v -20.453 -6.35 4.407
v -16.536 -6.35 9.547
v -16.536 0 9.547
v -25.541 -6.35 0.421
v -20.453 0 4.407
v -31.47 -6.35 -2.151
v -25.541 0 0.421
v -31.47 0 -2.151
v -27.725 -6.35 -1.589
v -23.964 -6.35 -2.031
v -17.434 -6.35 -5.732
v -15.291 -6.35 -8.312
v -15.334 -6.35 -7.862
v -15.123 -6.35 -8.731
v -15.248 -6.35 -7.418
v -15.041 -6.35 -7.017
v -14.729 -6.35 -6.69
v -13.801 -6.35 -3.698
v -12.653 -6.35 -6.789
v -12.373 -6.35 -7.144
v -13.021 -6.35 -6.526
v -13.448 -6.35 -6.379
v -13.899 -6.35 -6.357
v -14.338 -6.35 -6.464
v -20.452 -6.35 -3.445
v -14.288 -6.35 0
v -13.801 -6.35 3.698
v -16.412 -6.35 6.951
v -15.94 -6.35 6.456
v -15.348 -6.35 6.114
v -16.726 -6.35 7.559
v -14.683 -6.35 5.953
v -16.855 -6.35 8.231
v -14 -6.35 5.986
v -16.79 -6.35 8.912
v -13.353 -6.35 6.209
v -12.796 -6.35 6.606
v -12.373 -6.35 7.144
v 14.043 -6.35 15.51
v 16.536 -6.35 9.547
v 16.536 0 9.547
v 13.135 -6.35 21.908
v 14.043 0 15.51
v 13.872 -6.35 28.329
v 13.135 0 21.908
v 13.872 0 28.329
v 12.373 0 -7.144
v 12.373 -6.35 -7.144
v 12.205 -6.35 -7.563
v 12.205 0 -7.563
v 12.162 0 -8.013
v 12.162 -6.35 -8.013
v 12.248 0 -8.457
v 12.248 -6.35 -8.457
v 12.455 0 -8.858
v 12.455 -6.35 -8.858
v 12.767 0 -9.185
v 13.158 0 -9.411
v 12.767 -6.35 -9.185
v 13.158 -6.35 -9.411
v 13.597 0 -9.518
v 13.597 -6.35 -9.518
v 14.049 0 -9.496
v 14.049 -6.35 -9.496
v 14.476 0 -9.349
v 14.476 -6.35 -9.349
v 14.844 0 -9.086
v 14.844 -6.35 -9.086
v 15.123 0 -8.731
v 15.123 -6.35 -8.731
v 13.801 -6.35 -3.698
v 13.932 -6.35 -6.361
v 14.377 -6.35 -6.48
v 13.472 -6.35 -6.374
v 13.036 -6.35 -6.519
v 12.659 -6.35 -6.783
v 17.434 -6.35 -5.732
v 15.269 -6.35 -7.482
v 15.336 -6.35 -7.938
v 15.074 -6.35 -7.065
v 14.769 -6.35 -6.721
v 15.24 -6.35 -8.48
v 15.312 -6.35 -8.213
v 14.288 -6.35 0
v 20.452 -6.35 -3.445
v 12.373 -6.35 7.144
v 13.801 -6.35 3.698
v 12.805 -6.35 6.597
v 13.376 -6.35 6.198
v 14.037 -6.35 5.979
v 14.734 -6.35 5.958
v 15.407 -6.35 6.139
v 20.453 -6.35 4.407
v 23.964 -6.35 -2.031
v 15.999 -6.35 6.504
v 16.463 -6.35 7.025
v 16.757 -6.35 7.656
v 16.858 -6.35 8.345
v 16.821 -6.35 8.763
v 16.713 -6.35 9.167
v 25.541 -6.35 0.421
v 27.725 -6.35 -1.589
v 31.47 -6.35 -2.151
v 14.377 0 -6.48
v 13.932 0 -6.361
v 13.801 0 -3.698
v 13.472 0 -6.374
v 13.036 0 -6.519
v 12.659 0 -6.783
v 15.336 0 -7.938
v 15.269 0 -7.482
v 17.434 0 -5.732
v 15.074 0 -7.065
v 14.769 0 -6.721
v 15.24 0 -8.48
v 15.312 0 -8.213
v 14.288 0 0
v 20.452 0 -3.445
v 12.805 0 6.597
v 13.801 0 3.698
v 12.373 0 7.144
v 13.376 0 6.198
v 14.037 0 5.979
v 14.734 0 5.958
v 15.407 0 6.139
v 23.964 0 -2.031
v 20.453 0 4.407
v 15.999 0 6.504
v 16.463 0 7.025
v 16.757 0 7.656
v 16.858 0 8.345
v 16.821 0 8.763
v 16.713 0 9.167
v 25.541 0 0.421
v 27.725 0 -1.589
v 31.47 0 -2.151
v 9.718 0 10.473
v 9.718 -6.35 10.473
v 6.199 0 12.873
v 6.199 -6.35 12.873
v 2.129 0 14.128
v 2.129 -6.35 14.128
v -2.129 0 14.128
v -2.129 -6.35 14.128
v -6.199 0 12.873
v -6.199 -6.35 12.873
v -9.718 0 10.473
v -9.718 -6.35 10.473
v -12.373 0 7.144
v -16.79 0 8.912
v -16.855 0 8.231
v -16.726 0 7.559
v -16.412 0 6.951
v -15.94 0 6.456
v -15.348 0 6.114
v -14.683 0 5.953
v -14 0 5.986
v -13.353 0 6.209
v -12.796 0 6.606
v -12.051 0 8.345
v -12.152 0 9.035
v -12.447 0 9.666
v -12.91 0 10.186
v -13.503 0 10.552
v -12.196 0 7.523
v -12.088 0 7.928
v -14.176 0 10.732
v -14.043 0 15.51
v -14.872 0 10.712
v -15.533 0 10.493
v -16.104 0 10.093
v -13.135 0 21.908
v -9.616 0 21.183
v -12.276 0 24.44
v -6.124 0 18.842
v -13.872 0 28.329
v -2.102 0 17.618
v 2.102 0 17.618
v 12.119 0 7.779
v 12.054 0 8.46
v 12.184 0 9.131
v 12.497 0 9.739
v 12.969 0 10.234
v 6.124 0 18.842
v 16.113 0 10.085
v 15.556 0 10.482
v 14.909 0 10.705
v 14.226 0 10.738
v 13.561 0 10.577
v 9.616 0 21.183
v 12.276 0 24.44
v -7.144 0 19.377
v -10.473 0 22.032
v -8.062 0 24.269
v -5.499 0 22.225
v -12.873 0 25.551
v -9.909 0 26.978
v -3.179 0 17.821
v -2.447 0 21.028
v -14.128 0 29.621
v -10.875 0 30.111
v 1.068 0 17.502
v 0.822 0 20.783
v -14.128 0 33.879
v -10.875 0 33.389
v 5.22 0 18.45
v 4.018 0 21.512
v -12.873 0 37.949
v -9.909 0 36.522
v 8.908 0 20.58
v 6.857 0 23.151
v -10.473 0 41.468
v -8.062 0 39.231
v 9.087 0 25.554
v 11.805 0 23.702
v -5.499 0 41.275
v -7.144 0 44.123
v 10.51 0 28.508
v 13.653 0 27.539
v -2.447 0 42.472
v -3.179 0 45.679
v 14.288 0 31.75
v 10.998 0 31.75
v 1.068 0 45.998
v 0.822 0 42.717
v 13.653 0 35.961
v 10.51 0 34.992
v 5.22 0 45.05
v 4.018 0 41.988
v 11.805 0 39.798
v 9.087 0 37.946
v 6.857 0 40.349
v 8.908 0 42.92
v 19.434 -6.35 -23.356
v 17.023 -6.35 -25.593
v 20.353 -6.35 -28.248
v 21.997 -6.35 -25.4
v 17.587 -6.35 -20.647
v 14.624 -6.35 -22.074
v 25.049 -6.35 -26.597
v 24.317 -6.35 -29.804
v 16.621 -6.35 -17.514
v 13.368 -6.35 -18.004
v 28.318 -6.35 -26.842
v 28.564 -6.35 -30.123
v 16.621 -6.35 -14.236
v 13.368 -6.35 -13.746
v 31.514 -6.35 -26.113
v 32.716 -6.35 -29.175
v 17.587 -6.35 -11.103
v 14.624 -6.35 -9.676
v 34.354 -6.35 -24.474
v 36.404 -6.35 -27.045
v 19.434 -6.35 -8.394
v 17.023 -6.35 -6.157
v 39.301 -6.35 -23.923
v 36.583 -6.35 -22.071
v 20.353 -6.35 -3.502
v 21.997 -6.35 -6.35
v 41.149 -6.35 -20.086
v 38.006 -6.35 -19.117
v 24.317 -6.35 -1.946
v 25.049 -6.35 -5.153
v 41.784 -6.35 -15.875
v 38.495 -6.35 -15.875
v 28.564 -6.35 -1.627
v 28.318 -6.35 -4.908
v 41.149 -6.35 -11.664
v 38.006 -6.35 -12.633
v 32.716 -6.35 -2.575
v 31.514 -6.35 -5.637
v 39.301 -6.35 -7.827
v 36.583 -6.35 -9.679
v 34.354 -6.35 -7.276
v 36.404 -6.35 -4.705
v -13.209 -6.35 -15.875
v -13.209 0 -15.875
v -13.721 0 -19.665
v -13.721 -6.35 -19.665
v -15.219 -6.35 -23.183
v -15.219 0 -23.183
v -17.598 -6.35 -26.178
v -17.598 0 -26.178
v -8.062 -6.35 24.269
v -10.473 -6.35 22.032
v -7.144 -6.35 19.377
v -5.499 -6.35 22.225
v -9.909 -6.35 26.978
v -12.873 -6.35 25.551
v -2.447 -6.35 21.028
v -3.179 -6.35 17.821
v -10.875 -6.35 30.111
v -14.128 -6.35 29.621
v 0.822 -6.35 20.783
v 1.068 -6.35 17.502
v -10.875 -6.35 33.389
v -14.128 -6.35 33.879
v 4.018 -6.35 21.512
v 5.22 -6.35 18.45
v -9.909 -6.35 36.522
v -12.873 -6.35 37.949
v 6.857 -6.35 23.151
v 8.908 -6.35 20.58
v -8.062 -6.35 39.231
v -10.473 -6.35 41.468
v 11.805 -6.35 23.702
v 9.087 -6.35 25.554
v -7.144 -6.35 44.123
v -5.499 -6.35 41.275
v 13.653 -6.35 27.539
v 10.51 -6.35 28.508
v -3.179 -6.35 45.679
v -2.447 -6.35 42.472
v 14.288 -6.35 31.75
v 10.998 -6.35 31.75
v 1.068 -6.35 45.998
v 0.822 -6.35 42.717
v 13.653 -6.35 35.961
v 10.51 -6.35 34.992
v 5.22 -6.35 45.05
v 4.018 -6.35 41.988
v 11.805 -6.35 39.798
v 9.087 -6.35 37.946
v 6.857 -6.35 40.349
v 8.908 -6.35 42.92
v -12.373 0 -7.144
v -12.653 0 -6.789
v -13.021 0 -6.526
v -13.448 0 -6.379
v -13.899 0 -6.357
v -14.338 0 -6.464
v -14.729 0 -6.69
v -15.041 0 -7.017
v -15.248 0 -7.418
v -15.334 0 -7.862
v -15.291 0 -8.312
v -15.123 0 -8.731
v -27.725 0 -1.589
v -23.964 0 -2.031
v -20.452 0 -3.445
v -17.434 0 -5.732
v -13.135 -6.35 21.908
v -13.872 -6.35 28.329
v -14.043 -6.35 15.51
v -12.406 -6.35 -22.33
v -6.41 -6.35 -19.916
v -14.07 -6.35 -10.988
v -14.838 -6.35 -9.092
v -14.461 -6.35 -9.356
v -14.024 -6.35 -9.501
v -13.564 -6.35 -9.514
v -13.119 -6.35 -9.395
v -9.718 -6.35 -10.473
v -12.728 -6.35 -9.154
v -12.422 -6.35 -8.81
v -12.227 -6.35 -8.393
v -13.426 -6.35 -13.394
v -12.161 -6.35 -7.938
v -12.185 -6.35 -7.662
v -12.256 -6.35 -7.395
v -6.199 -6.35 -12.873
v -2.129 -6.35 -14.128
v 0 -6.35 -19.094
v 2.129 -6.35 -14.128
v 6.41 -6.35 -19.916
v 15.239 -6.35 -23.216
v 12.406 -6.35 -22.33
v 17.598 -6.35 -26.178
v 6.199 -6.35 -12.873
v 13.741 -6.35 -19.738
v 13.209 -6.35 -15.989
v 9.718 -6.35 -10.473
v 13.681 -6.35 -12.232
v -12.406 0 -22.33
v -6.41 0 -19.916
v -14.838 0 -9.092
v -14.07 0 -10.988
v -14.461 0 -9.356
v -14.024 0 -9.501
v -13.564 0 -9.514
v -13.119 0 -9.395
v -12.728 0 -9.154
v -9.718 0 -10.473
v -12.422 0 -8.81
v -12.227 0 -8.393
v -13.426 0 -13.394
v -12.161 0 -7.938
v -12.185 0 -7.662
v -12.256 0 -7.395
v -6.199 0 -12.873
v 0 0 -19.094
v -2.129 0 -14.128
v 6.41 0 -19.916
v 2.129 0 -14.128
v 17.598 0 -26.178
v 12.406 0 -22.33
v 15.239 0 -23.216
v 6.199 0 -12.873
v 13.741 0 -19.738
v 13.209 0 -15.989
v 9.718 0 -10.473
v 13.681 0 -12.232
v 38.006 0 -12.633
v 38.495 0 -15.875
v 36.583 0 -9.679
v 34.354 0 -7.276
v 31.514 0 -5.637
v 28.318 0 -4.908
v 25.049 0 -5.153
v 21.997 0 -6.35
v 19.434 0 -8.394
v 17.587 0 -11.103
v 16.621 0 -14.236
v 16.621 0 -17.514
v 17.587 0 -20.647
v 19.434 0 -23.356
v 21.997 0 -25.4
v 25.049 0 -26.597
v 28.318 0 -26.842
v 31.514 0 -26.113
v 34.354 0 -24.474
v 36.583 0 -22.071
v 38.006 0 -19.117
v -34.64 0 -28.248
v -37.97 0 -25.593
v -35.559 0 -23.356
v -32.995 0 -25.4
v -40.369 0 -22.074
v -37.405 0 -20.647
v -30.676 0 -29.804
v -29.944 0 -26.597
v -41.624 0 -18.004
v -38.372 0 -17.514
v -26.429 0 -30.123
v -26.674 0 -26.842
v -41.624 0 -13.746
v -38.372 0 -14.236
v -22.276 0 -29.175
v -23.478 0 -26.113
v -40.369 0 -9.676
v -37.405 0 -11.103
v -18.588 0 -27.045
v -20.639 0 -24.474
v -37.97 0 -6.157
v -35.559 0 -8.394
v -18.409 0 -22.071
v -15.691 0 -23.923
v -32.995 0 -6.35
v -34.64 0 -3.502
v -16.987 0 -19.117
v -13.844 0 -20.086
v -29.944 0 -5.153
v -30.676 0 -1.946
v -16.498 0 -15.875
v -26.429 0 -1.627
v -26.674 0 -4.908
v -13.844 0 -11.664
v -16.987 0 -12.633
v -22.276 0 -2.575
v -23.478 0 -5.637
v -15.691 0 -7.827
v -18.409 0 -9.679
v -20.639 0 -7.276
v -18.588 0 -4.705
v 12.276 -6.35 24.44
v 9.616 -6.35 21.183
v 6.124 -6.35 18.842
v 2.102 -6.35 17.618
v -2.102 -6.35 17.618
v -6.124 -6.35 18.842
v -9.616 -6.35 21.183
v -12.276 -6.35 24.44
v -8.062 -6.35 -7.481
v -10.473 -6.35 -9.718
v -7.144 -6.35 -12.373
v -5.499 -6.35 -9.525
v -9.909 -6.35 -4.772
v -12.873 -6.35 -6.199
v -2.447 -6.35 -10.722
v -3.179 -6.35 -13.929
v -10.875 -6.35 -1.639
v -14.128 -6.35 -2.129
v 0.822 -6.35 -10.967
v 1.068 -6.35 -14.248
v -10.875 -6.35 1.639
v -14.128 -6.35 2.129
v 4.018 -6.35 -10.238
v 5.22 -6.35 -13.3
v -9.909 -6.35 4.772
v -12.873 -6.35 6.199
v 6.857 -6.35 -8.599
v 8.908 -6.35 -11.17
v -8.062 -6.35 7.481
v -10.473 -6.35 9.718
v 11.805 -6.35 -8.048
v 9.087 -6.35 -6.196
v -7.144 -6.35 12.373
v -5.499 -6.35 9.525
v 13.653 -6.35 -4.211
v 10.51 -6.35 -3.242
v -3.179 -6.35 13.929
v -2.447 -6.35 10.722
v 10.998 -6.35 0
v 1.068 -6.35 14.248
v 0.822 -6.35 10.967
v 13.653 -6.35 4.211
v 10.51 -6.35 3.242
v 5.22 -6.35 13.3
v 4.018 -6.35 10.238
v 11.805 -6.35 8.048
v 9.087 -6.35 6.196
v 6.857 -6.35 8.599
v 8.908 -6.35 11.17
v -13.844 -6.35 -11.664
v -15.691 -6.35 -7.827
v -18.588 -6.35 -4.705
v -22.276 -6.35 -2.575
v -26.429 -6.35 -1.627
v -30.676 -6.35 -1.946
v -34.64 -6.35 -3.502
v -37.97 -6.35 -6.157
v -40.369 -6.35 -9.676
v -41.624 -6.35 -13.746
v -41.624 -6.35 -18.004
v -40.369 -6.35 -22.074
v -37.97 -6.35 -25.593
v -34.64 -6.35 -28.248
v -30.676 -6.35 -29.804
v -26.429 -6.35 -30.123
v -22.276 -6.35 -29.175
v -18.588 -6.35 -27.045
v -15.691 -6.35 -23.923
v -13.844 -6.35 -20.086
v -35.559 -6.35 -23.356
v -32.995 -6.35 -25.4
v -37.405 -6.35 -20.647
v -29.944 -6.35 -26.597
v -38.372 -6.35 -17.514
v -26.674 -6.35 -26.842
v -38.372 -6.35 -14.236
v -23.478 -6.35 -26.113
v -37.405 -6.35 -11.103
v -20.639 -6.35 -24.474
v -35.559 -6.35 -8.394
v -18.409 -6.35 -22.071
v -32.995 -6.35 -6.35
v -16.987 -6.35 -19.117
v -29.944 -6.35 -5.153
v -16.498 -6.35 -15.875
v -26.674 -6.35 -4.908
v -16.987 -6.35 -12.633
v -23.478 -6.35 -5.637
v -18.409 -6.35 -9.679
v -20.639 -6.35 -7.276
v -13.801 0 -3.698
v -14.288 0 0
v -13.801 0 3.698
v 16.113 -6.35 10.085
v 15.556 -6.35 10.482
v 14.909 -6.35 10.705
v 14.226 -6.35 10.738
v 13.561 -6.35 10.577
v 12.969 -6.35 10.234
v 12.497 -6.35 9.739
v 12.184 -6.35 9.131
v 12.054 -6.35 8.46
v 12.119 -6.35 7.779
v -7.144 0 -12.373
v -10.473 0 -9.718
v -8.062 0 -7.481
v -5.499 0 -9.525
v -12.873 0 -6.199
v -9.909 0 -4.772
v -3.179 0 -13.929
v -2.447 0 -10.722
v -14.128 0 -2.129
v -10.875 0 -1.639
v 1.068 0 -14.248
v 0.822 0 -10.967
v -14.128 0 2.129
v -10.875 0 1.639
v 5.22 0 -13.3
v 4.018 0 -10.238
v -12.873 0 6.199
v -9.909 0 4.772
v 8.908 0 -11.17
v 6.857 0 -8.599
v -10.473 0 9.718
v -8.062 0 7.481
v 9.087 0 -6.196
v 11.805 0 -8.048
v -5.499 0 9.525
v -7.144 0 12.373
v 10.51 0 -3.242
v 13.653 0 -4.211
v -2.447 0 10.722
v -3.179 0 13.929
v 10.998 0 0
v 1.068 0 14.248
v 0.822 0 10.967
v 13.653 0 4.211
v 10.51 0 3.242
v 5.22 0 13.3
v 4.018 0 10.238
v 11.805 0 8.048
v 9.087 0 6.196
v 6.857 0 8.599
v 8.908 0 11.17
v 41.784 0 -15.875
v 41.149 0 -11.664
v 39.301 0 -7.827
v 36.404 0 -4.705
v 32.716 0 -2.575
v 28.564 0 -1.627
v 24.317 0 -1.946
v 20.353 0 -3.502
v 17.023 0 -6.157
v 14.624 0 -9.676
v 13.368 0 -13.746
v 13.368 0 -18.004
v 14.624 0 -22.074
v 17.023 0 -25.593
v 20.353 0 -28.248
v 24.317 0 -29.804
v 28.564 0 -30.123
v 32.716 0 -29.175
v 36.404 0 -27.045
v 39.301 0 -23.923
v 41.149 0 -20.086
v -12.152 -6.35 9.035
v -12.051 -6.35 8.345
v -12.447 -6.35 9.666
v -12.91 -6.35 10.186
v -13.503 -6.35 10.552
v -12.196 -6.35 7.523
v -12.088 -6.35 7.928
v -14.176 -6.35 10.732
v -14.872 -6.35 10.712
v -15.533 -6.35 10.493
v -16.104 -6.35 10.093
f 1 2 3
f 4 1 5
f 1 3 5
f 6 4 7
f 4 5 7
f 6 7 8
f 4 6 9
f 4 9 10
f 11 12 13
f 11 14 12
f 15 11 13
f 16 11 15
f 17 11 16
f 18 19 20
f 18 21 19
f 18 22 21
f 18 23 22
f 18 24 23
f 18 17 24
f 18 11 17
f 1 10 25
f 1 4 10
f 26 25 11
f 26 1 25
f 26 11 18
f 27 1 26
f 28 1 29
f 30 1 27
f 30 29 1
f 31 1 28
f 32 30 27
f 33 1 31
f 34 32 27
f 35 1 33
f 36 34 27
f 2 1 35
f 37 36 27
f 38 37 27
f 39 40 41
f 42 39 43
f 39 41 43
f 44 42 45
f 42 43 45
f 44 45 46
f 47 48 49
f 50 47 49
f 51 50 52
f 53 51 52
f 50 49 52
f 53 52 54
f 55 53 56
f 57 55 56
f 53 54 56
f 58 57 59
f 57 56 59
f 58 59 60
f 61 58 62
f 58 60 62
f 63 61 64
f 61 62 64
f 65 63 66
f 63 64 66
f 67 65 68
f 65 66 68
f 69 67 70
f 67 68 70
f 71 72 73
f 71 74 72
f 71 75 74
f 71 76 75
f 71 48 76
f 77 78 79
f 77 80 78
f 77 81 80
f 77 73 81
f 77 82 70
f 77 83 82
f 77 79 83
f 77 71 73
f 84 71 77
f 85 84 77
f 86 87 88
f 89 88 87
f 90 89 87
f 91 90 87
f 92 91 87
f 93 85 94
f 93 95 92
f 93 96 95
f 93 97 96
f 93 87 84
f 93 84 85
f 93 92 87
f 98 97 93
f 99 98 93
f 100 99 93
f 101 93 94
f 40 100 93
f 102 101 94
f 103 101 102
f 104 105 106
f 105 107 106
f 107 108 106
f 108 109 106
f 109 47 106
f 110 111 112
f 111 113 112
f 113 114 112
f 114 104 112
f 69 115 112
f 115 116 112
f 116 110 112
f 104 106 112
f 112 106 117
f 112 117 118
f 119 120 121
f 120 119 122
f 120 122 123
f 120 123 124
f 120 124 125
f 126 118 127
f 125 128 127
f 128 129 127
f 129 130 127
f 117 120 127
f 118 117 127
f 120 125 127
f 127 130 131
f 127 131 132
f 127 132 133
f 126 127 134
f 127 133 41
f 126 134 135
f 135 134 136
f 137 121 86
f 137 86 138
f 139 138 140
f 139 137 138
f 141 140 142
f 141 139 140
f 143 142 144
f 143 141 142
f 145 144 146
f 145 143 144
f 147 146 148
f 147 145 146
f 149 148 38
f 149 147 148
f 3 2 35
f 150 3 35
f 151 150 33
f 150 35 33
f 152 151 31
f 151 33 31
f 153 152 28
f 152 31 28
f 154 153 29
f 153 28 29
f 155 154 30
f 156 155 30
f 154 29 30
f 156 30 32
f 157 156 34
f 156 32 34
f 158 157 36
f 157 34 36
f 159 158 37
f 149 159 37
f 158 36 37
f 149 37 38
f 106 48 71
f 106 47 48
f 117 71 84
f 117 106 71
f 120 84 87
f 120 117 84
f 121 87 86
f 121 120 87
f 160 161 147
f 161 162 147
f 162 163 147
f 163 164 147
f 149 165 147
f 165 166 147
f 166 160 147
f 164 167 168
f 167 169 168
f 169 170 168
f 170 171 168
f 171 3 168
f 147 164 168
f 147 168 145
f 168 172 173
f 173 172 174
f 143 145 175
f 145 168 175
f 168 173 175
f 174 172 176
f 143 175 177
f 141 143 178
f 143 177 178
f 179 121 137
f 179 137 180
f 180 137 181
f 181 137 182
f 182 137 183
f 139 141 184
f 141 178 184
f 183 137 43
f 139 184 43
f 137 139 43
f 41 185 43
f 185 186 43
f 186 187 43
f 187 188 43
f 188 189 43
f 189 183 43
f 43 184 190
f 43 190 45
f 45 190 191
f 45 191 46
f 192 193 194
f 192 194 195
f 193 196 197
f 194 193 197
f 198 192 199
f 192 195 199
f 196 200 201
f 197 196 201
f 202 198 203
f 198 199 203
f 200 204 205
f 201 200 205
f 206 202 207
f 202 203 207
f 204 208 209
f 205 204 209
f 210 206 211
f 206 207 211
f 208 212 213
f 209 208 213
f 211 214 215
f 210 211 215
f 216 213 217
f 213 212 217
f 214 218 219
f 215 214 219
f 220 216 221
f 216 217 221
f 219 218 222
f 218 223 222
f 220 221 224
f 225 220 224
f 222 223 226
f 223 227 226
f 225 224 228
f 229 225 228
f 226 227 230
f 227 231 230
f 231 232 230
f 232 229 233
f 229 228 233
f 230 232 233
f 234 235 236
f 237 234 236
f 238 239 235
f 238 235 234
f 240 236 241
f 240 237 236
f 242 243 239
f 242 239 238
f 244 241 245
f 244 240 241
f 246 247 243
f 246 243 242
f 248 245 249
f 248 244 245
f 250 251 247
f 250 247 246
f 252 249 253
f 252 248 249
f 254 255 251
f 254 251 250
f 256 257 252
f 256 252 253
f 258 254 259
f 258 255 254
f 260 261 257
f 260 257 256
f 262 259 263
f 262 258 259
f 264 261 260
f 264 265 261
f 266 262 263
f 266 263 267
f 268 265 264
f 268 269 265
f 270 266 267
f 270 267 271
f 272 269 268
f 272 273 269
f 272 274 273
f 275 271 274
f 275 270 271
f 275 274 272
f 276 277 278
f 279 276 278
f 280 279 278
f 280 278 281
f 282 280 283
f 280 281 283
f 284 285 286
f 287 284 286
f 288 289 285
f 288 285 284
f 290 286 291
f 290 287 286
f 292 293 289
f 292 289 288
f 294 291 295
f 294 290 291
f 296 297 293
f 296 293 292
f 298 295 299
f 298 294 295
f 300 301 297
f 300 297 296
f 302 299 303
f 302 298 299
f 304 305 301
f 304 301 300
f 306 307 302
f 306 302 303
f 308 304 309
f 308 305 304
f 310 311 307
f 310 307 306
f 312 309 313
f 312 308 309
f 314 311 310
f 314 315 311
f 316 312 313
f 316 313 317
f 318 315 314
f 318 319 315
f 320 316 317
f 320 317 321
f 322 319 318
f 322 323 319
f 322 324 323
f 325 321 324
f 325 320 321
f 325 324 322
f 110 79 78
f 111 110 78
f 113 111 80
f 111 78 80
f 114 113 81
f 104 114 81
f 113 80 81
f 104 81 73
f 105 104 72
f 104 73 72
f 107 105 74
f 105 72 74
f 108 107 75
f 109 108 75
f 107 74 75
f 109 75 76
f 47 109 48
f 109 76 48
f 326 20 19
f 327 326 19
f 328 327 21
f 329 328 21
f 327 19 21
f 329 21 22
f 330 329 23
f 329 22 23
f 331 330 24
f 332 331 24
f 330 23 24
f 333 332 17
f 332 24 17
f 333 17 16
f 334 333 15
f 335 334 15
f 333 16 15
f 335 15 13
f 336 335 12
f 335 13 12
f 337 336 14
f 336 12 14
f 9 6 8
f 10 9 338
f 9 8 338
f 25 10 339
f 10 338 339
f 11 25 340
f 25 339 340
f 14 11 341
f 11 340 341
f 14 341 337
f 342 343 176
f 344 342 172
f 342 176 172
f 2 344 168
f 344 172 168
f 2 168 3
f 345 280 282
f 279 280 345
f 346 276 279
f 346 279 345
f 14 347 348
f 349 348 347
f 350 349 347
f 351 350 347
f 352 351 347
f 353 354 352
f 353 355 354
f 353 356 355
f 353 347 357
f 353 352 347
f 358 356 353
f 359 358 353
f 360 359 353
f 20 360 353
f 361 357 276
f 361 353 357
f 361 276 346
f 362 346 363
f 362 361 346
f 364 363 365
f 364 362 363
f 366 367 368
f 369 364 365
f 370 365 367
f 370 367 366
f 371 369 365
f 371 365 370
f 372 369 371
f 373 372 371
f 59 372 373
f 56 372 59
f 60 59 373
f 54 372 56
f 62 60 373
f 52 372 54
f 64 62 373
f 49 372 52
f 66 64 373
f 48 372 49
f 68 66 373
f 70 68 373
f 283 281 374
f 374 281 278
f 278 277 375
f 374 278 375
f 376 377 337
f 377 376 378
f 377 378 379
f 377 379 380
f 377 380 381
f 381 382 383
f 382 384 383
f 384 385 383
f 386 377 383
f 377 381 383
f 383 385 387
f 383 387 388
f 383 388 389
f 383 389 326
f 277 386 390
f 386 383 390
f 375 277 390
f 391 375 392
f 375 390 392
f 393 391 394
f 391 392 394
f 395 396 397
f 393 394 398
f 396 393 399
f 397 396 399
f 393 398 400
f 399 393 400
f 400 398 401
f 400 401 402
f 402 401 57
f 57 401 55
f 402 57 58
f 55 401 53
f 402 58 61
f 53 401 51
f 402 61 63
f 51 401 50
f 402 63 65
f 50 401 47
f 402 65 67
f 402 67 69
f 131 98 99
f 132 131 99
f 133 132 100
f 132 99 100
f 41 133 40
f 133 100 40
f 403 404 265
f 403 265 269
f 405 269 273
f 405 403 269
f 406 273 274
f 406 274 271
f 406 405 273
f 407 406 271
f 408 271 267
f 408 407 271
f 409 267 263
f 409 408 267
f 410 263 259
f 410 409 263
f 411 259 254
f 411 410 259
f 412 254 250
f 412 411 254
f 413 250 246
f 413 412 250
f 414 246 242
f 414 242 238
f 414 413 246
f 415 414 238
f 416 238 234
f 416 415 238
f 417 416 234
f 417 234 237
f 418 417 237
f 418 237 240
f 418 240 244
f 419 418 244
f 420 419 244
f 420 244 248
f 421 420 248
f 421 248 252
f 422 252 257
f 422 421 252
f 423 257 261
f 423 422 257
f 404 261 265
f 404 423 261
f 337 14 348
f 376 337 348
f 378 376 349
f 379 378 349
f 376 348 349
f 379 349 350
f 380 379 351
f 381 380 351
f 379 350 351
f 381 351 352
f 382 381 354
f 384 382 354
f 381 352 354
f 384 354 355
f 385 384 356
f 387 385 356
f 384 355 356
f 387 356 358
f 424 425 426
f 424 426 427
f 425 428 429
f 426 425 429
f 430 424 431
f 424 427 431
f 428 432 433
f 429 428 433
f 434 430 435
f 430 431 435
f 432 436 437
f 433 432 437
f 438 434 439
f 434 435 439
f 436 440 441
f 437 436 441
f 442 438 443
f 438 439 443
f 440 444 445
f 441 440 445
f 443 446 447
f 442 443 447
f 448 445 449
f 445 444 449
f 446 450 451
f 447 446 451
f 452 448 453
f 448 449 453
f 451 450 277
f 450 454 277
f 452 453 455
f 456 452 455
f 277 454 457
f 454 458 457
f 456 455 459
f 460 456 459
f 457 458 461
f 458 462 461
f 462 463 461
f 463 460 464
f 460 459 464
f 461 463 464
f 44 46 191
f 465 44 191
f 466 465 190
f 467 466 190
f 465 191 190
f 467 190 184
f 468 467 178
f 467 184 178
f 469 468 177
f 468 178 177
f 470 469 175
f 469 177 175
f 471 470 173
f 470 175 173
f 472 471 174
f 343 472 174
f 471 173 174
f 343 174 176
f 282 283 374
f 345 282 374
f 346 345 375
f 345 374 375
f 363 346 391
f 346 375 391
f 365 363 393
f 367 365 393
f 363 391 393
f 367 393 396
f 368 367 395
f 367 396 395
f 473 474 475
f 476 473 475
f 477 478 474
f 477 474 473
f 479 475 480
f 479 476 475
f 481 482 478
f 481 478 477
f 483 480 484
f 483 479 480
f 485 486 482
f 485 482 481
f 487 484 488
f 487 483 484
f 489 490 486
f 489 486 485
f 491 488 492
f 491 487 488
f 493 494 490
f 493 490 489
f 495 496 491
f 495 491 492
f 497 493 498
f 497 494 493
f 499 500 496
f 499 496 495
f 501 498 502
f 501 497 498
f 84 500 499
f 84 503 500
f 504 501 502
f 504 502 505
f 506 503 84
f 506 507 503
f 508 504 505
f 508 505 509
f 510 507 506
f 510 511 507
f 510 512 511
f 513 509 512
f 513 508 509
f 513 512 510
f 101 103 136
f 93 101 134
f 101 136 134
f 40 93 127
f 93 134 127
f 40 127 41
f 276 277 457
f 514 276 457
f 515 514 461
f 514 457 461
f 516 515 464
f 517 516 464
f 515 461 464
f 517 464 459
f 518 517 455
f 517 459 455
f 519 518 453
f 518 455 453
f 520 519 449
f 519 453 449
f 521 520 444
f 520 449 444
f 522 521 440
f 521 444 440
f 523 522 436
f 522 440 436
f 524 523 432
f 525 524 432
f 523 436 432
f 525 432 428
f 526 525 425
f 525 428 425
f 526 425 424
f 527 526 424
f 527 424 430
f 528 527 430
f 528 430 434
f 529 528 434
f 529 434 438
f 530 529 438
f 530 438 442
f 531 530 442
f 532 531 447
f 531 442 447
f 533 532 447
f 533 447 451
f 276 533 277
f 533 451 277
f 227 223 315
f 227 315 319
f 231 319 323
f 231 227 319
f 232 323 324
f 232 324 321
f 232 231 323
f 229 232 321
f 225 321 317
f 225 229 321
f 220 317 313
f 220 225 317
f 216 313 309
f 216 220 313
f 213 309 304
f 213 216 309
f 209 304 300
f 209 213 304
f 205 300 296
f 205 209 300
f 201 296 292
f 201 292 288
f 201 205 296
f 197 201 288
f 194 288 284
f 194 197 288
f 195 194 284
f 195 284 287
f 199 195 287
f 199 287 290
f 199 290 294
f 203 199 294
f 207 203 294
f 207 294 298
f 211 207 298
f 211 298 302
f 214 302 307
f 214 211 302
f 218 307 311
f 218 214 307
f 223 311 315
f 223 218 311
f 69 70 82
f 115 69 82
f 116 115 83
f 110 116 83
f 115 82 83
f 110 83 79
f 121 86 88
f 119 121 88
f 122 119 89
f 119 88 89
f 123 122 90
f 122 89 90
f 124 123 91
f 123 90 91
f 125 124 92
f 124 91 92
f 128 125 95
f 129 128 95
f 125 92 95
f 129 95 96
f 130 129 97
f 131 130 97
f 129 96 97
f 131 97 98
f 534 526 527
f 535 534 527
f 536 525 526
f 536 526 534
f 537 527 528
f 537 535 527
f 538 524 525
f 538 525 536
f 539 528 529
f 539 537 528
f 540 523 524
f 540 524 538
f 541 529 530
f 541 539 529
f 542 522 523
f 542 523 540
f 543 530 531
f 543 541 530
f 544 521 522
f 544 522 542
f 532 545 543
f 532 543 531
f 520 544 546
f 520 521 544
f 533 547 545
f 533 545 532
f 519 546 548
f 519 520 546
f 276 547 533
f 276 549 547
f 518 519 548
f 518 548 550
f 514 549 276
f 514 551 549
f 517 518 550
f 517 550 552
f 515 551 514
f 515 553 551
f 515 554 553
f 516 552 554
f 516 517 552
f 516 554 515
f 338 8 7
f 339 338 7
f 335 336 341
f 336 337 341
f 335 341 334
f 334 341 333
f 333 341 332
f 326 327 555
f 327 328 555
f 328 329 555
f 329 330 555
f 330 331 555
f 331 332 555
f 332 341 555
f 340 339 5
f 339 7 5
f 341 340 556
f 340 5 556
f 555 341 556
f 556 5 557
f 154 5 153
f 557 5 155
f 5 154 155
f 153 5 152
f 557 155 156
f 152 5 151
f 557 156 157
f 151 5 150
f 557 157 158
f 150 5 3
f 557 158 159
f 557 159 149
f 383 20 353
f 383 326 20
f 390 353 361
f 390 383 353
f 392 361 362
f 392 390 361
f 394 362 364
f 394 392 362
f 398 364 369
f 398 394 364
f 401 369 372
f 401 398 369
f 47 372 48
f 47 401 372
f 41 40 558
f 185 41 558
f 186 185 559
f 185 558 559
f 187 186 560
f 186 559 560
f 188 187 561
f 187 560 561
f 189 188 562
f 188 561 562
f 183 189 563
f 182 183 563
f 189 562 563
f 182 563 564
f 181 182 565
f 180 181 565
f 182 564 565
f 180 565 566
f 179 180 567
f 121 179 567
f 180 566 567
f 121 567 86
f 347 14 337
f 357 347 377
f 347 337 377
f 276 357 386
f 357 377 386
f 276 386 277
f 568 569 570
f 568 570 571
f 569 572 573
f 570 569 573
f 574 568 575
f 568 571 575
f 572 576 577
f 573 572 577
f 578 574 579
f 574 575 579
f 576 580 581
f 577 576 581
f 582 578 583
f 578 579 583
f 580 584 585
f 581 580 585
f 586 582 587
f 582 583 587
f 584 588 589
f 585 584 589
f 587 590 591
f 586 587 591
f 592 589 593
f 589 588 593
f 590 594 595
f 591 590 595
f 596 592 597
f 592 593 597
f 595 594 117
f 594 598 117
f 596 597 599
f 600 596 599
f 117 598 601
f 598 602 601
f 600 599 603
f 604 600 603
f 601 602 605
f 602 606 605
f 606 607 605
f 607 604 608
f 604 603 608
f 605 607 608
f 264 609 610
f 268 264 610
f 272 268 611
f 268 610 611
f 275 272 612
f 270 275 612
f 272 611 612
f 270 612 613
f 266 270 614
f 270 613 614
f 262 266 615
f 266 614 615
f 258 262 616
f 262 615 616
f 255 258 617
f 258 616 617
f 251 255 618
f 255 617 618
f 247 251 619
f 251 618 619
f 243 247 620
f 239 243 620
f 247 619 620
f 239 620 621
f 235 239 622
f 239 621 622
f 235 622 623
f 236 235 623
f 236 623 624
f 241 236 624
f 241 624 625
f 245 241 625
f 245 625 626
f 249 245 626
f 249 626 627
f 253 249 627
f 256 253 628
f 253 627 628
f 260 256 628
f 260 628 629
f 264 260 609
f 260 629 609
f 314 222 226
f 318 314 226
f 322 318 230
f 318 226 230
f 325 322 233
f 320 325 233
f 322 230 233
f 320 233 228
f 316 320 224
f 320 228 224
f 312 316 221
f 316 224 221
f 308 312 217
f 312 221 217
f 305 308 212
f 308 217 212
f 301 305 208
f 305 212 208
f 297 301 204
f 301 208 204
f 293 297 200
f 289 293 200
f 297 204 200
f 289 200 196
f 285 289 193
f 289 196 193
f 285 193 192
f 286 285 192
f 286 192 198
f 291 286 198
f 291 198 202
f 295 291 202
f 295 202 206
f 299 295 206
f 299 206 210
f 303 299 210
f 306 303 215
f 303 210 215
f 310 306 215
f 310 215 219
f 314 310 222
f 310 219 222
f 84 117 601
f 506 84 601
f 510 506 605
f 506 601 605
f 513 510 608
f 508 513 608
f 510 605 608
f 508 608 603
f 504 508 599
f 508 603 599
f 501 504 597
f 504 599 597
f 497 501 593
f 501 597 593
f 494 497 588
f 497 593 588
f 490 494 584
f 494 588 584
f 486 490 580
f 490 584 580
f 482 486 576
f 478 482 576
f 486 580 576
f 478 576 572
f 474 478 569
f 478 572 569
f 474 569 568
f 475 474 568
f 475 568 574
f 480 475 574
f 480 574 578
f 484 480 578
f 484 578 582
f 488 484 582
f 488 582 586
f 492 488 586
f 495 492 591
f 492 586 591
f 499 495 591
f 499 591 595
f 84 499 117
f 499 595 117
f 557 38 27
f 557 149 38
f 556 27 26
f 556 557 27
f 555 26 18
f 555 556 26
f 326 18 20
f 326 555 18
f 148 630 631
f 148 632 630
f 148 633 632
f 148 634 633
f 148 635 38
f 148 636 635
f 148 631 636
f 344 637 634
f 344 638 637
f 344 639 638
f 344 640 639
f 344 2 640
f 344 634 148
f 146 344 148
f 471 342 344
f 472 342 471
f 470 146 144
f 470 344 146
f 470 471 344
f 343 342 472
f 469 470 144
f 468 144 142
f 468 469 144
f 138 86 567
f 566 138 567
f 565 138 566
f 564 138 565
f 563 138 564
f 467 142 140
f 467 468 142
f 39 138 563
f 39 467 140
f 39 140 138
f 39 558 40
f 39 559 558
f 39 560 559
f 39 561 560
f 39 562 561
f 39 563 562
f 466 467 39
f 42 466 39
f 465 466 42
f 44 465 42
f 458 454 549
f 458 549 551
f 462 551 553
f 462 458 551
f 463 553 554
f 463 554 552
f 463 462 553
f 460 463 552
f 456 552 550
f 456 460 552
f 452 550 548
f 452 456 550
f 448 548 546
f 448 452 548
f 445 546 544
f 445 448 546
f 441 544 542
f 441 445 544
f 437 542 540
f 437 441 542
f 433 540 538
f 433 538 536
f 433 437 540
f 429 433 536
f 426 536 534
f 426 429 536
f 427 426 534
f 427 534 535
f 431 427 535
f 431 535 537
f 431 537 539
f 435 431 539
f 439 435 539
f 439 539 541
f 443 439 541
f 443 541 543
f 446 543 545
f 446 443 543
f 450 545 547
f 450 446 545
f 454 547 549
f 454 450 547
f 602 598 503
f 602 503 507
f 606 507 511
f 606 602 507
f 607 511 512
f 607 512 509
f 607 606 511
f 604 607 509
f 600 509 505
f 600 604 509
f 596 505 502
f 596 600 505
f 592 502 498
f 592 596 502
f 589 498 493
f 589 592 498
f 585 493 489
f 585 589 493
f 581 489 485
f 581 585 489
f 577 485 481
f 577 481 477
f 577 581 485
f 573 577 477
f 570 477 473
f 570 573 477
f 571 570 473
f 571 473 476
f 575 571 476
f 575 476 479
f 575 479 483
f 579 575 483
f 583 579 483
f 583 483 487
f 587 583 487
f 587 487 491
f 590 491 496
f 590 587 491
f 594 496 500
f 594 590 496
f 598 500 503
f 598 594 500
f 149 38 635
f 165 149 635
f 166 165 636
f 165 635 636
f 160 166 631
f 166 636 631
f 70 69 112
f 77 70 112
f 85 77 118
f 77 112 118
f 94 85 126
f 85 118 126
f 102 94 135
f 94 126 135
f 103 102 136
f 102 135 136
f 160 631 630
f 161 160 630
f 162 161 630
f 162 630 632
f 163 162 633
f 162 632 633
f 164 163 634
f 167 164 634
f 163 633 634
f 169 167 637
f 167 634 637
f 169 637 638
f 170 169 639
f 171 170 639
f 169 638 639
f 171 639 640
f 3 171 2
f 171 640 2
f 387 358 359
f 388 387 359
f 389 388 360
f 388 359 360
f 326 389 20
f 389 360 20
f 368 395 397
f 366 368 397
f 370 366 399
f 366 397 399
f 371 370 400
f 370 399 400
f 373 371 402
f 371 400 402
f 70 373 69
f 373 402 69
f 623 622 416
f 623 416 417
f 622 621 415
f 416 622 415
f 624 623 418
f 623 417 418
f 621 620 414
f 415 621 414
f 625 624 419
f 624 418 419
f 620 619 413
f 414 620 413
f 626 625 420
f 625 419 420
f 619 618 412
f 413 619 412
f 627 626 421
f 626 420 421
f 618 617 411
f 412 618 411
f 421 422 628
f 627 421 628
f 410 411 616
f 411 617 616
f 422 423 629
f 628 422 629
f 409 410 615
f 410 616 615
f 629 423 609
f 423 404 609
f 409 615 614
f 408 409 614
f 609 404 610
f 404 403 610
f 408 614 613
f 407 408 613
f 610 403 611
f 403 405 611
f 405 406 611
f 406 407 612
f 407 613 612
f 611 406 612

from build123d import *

# Parameters (mm, degrees)
F1_R     = 14.2875
F2_DEPTH = 6.35
F0_R     = 14.2875
F0_R_2   = 10.9982
F6_DEPTH = 25.4
F8_DEPTH = 25.4


with BuildPart() as f2:
    # F1 (on Front) → F2 (new body)
    with BuildSketch(Plane.XZ):
        with BuildLine():
            ThreePointArc((13.8718760728, 28.3289313848), (0, 17.4625), (-13.8718760728, 28.3289313848))
            ThreePointArc((-13.8718760728, 28.3289313848), (-16.5359438351, 9.5470316245), (-31.4695122777, -2.1510686152))
            ThreePointArc((-31.4695122777, -2.1510686152), (-18.912441482, -4.4535326513), (-13.2088065702, -15.875))
            ThreePointArc((-13.2088065702, -15.875), (-14.3517276668, -21.4743483284), (-17.5976362049, -26.1778627696))
            ThreePointArc((-17.5976362049, -26.1778627696), (0, -19.094063249), (17.5976362049, -26.1778627696))
            ThreePointArc((17.5976362049, -26.1778627696), (15.1229686136, -8.73125), (31.4695122777, -2.1510686152))
            ThreePointArc((31.4695122777, -2.1510686152), (16.5359438351, 9.5470316245), (13.8718760728, 28.3289313848))
        make_face()
        Circle(F1_R, mode=Mode.SUBTRACT)
    extrude(amount=F2_DEPTH)

    # F5 (on face) → F6 (cut)
    with BuildSketch(Plane.XZ.offset(6.35)):
        with BuildLine():
            ThreePointArc((12.3733379823, 7.1437499555), (15.0766559758, 6.02399903), (16.8579225203, 8.3453908122))
            ThreePointArc((16.8579225203, 8.3453908122), (16.7760327127, 8.9674057632), (16.535943943, 9.5470314377))
            ThreePointArc((16.535943943, 9.5470314377), (13.2530001547, 10.4266937926), (12.3733379823, 7.1437499555))
        make_face()
        with BuildLine():
            ThreePointArc((-16.5359438155, 9.5470316585), (-15.6562817429, 6.2640878931), (-12.3733379771, 7.1437499644))
            ThreePointArc((-12.3733379771, 7.1437499644), (-12.1332491122, 7.7233757372), (-12.0513592713, 8.3453908122))
            ThreePointArc((-12.0513592713, 8.3453908122), (-13.8326258217, 10.6667825961), (-16.5359438155, 9.5470316585))
        make_face()
    extrude(amount=-F6_DEPTH, mode=Mode.SUBTRACT)

    # F7 (on face) → F8 (cut)
    with BuildSketch(Plane.XZ.offset(6.35)):
        with BuildLine():
            ThreePointArc((15.1229686575, -8.731249924), (15.2815605457, -8.3483751917), (15.3356532851, -7.9375))
            ThreePointArc((15.3356532851, -7.9375), (14.1590284355, -6.4040927283), (12.3733378699, -7.1437501501))
            ThreePointArc((12.3733378699, -7.1437501501), (12.9544033981, -9.3123153938), (15.1229686575, -8.731249924))
        make_face()
        with BuildLine():
            ThreePointArc((-12.1606532851, -7.9375), (-12.2147460382, -7.5266247571), (-12.3733379657, -7.1437499842))
            ThreePointArc((-12.3733379657, -7.1437499842), (-14.5419032233, -6.5626846358), (-15.122968694, -8.7312498607))
            ThreePointArc((-15.122968694, -8.7312498607), (-13.3372781286, -9.47090727), (-12.1606532851, -7.9375))
        make_face()
    extrude(amount=-F8_DEPTH, mode=Mode.SUBTRACT)


with BuildPart() as f2b:
    # F0 (on Front) → F2, piece 2 (new body)
    with BuildSketch(Plane.XZ):
        with Locations((0, 31.75)):
            Circle(F0_R)
        with Locations((0, 31.75)):
            Circle(F0_R_2, mode=Mode.SUBTRACT)
    extrude(amount=F2_DEPTH)


with BuildPart() as f2c:
    # F0 (on Front) → F2, piece 3 (new body)
    with BuildSketch(Plane.XZ):
        with Locations((-27.4963065702, -15.875)):
            Circle(F0_R)
        with Locations((-27.4963065702, -15.875)):
            Circle(F0_R_2, mode=Mode.SUBTRACT)
    extrude(amount=F2_DEPTH)


with BuildPart() as f2d:
    # F0 (on Front) → F2, piece 4 (new body)
    with BuildSketch(Plane.XZ):
        with Locations((27.4963065702, -15.875)):
            Circle(F0_R)
        with Locations((27.4963065702, -15.875)):
            Circle(F0_R_2, mode=Mode.SUBTRACT)
    extrude(amount=F2_DEPTH)


with BuildPart() as f2e:
    # F0 (on Front) → F2, piece 5 (new body)
    with BuildSketch(Plane.XZ):
        Circle(F0_R)
        Circle(F0_R_2, mode=Mode.SUBTRACT)
    extrude(amount=F2_DEPTH)


solid = Compound([f2.part, f2b.part, f2c.part, f2d.part, f2e.part])
